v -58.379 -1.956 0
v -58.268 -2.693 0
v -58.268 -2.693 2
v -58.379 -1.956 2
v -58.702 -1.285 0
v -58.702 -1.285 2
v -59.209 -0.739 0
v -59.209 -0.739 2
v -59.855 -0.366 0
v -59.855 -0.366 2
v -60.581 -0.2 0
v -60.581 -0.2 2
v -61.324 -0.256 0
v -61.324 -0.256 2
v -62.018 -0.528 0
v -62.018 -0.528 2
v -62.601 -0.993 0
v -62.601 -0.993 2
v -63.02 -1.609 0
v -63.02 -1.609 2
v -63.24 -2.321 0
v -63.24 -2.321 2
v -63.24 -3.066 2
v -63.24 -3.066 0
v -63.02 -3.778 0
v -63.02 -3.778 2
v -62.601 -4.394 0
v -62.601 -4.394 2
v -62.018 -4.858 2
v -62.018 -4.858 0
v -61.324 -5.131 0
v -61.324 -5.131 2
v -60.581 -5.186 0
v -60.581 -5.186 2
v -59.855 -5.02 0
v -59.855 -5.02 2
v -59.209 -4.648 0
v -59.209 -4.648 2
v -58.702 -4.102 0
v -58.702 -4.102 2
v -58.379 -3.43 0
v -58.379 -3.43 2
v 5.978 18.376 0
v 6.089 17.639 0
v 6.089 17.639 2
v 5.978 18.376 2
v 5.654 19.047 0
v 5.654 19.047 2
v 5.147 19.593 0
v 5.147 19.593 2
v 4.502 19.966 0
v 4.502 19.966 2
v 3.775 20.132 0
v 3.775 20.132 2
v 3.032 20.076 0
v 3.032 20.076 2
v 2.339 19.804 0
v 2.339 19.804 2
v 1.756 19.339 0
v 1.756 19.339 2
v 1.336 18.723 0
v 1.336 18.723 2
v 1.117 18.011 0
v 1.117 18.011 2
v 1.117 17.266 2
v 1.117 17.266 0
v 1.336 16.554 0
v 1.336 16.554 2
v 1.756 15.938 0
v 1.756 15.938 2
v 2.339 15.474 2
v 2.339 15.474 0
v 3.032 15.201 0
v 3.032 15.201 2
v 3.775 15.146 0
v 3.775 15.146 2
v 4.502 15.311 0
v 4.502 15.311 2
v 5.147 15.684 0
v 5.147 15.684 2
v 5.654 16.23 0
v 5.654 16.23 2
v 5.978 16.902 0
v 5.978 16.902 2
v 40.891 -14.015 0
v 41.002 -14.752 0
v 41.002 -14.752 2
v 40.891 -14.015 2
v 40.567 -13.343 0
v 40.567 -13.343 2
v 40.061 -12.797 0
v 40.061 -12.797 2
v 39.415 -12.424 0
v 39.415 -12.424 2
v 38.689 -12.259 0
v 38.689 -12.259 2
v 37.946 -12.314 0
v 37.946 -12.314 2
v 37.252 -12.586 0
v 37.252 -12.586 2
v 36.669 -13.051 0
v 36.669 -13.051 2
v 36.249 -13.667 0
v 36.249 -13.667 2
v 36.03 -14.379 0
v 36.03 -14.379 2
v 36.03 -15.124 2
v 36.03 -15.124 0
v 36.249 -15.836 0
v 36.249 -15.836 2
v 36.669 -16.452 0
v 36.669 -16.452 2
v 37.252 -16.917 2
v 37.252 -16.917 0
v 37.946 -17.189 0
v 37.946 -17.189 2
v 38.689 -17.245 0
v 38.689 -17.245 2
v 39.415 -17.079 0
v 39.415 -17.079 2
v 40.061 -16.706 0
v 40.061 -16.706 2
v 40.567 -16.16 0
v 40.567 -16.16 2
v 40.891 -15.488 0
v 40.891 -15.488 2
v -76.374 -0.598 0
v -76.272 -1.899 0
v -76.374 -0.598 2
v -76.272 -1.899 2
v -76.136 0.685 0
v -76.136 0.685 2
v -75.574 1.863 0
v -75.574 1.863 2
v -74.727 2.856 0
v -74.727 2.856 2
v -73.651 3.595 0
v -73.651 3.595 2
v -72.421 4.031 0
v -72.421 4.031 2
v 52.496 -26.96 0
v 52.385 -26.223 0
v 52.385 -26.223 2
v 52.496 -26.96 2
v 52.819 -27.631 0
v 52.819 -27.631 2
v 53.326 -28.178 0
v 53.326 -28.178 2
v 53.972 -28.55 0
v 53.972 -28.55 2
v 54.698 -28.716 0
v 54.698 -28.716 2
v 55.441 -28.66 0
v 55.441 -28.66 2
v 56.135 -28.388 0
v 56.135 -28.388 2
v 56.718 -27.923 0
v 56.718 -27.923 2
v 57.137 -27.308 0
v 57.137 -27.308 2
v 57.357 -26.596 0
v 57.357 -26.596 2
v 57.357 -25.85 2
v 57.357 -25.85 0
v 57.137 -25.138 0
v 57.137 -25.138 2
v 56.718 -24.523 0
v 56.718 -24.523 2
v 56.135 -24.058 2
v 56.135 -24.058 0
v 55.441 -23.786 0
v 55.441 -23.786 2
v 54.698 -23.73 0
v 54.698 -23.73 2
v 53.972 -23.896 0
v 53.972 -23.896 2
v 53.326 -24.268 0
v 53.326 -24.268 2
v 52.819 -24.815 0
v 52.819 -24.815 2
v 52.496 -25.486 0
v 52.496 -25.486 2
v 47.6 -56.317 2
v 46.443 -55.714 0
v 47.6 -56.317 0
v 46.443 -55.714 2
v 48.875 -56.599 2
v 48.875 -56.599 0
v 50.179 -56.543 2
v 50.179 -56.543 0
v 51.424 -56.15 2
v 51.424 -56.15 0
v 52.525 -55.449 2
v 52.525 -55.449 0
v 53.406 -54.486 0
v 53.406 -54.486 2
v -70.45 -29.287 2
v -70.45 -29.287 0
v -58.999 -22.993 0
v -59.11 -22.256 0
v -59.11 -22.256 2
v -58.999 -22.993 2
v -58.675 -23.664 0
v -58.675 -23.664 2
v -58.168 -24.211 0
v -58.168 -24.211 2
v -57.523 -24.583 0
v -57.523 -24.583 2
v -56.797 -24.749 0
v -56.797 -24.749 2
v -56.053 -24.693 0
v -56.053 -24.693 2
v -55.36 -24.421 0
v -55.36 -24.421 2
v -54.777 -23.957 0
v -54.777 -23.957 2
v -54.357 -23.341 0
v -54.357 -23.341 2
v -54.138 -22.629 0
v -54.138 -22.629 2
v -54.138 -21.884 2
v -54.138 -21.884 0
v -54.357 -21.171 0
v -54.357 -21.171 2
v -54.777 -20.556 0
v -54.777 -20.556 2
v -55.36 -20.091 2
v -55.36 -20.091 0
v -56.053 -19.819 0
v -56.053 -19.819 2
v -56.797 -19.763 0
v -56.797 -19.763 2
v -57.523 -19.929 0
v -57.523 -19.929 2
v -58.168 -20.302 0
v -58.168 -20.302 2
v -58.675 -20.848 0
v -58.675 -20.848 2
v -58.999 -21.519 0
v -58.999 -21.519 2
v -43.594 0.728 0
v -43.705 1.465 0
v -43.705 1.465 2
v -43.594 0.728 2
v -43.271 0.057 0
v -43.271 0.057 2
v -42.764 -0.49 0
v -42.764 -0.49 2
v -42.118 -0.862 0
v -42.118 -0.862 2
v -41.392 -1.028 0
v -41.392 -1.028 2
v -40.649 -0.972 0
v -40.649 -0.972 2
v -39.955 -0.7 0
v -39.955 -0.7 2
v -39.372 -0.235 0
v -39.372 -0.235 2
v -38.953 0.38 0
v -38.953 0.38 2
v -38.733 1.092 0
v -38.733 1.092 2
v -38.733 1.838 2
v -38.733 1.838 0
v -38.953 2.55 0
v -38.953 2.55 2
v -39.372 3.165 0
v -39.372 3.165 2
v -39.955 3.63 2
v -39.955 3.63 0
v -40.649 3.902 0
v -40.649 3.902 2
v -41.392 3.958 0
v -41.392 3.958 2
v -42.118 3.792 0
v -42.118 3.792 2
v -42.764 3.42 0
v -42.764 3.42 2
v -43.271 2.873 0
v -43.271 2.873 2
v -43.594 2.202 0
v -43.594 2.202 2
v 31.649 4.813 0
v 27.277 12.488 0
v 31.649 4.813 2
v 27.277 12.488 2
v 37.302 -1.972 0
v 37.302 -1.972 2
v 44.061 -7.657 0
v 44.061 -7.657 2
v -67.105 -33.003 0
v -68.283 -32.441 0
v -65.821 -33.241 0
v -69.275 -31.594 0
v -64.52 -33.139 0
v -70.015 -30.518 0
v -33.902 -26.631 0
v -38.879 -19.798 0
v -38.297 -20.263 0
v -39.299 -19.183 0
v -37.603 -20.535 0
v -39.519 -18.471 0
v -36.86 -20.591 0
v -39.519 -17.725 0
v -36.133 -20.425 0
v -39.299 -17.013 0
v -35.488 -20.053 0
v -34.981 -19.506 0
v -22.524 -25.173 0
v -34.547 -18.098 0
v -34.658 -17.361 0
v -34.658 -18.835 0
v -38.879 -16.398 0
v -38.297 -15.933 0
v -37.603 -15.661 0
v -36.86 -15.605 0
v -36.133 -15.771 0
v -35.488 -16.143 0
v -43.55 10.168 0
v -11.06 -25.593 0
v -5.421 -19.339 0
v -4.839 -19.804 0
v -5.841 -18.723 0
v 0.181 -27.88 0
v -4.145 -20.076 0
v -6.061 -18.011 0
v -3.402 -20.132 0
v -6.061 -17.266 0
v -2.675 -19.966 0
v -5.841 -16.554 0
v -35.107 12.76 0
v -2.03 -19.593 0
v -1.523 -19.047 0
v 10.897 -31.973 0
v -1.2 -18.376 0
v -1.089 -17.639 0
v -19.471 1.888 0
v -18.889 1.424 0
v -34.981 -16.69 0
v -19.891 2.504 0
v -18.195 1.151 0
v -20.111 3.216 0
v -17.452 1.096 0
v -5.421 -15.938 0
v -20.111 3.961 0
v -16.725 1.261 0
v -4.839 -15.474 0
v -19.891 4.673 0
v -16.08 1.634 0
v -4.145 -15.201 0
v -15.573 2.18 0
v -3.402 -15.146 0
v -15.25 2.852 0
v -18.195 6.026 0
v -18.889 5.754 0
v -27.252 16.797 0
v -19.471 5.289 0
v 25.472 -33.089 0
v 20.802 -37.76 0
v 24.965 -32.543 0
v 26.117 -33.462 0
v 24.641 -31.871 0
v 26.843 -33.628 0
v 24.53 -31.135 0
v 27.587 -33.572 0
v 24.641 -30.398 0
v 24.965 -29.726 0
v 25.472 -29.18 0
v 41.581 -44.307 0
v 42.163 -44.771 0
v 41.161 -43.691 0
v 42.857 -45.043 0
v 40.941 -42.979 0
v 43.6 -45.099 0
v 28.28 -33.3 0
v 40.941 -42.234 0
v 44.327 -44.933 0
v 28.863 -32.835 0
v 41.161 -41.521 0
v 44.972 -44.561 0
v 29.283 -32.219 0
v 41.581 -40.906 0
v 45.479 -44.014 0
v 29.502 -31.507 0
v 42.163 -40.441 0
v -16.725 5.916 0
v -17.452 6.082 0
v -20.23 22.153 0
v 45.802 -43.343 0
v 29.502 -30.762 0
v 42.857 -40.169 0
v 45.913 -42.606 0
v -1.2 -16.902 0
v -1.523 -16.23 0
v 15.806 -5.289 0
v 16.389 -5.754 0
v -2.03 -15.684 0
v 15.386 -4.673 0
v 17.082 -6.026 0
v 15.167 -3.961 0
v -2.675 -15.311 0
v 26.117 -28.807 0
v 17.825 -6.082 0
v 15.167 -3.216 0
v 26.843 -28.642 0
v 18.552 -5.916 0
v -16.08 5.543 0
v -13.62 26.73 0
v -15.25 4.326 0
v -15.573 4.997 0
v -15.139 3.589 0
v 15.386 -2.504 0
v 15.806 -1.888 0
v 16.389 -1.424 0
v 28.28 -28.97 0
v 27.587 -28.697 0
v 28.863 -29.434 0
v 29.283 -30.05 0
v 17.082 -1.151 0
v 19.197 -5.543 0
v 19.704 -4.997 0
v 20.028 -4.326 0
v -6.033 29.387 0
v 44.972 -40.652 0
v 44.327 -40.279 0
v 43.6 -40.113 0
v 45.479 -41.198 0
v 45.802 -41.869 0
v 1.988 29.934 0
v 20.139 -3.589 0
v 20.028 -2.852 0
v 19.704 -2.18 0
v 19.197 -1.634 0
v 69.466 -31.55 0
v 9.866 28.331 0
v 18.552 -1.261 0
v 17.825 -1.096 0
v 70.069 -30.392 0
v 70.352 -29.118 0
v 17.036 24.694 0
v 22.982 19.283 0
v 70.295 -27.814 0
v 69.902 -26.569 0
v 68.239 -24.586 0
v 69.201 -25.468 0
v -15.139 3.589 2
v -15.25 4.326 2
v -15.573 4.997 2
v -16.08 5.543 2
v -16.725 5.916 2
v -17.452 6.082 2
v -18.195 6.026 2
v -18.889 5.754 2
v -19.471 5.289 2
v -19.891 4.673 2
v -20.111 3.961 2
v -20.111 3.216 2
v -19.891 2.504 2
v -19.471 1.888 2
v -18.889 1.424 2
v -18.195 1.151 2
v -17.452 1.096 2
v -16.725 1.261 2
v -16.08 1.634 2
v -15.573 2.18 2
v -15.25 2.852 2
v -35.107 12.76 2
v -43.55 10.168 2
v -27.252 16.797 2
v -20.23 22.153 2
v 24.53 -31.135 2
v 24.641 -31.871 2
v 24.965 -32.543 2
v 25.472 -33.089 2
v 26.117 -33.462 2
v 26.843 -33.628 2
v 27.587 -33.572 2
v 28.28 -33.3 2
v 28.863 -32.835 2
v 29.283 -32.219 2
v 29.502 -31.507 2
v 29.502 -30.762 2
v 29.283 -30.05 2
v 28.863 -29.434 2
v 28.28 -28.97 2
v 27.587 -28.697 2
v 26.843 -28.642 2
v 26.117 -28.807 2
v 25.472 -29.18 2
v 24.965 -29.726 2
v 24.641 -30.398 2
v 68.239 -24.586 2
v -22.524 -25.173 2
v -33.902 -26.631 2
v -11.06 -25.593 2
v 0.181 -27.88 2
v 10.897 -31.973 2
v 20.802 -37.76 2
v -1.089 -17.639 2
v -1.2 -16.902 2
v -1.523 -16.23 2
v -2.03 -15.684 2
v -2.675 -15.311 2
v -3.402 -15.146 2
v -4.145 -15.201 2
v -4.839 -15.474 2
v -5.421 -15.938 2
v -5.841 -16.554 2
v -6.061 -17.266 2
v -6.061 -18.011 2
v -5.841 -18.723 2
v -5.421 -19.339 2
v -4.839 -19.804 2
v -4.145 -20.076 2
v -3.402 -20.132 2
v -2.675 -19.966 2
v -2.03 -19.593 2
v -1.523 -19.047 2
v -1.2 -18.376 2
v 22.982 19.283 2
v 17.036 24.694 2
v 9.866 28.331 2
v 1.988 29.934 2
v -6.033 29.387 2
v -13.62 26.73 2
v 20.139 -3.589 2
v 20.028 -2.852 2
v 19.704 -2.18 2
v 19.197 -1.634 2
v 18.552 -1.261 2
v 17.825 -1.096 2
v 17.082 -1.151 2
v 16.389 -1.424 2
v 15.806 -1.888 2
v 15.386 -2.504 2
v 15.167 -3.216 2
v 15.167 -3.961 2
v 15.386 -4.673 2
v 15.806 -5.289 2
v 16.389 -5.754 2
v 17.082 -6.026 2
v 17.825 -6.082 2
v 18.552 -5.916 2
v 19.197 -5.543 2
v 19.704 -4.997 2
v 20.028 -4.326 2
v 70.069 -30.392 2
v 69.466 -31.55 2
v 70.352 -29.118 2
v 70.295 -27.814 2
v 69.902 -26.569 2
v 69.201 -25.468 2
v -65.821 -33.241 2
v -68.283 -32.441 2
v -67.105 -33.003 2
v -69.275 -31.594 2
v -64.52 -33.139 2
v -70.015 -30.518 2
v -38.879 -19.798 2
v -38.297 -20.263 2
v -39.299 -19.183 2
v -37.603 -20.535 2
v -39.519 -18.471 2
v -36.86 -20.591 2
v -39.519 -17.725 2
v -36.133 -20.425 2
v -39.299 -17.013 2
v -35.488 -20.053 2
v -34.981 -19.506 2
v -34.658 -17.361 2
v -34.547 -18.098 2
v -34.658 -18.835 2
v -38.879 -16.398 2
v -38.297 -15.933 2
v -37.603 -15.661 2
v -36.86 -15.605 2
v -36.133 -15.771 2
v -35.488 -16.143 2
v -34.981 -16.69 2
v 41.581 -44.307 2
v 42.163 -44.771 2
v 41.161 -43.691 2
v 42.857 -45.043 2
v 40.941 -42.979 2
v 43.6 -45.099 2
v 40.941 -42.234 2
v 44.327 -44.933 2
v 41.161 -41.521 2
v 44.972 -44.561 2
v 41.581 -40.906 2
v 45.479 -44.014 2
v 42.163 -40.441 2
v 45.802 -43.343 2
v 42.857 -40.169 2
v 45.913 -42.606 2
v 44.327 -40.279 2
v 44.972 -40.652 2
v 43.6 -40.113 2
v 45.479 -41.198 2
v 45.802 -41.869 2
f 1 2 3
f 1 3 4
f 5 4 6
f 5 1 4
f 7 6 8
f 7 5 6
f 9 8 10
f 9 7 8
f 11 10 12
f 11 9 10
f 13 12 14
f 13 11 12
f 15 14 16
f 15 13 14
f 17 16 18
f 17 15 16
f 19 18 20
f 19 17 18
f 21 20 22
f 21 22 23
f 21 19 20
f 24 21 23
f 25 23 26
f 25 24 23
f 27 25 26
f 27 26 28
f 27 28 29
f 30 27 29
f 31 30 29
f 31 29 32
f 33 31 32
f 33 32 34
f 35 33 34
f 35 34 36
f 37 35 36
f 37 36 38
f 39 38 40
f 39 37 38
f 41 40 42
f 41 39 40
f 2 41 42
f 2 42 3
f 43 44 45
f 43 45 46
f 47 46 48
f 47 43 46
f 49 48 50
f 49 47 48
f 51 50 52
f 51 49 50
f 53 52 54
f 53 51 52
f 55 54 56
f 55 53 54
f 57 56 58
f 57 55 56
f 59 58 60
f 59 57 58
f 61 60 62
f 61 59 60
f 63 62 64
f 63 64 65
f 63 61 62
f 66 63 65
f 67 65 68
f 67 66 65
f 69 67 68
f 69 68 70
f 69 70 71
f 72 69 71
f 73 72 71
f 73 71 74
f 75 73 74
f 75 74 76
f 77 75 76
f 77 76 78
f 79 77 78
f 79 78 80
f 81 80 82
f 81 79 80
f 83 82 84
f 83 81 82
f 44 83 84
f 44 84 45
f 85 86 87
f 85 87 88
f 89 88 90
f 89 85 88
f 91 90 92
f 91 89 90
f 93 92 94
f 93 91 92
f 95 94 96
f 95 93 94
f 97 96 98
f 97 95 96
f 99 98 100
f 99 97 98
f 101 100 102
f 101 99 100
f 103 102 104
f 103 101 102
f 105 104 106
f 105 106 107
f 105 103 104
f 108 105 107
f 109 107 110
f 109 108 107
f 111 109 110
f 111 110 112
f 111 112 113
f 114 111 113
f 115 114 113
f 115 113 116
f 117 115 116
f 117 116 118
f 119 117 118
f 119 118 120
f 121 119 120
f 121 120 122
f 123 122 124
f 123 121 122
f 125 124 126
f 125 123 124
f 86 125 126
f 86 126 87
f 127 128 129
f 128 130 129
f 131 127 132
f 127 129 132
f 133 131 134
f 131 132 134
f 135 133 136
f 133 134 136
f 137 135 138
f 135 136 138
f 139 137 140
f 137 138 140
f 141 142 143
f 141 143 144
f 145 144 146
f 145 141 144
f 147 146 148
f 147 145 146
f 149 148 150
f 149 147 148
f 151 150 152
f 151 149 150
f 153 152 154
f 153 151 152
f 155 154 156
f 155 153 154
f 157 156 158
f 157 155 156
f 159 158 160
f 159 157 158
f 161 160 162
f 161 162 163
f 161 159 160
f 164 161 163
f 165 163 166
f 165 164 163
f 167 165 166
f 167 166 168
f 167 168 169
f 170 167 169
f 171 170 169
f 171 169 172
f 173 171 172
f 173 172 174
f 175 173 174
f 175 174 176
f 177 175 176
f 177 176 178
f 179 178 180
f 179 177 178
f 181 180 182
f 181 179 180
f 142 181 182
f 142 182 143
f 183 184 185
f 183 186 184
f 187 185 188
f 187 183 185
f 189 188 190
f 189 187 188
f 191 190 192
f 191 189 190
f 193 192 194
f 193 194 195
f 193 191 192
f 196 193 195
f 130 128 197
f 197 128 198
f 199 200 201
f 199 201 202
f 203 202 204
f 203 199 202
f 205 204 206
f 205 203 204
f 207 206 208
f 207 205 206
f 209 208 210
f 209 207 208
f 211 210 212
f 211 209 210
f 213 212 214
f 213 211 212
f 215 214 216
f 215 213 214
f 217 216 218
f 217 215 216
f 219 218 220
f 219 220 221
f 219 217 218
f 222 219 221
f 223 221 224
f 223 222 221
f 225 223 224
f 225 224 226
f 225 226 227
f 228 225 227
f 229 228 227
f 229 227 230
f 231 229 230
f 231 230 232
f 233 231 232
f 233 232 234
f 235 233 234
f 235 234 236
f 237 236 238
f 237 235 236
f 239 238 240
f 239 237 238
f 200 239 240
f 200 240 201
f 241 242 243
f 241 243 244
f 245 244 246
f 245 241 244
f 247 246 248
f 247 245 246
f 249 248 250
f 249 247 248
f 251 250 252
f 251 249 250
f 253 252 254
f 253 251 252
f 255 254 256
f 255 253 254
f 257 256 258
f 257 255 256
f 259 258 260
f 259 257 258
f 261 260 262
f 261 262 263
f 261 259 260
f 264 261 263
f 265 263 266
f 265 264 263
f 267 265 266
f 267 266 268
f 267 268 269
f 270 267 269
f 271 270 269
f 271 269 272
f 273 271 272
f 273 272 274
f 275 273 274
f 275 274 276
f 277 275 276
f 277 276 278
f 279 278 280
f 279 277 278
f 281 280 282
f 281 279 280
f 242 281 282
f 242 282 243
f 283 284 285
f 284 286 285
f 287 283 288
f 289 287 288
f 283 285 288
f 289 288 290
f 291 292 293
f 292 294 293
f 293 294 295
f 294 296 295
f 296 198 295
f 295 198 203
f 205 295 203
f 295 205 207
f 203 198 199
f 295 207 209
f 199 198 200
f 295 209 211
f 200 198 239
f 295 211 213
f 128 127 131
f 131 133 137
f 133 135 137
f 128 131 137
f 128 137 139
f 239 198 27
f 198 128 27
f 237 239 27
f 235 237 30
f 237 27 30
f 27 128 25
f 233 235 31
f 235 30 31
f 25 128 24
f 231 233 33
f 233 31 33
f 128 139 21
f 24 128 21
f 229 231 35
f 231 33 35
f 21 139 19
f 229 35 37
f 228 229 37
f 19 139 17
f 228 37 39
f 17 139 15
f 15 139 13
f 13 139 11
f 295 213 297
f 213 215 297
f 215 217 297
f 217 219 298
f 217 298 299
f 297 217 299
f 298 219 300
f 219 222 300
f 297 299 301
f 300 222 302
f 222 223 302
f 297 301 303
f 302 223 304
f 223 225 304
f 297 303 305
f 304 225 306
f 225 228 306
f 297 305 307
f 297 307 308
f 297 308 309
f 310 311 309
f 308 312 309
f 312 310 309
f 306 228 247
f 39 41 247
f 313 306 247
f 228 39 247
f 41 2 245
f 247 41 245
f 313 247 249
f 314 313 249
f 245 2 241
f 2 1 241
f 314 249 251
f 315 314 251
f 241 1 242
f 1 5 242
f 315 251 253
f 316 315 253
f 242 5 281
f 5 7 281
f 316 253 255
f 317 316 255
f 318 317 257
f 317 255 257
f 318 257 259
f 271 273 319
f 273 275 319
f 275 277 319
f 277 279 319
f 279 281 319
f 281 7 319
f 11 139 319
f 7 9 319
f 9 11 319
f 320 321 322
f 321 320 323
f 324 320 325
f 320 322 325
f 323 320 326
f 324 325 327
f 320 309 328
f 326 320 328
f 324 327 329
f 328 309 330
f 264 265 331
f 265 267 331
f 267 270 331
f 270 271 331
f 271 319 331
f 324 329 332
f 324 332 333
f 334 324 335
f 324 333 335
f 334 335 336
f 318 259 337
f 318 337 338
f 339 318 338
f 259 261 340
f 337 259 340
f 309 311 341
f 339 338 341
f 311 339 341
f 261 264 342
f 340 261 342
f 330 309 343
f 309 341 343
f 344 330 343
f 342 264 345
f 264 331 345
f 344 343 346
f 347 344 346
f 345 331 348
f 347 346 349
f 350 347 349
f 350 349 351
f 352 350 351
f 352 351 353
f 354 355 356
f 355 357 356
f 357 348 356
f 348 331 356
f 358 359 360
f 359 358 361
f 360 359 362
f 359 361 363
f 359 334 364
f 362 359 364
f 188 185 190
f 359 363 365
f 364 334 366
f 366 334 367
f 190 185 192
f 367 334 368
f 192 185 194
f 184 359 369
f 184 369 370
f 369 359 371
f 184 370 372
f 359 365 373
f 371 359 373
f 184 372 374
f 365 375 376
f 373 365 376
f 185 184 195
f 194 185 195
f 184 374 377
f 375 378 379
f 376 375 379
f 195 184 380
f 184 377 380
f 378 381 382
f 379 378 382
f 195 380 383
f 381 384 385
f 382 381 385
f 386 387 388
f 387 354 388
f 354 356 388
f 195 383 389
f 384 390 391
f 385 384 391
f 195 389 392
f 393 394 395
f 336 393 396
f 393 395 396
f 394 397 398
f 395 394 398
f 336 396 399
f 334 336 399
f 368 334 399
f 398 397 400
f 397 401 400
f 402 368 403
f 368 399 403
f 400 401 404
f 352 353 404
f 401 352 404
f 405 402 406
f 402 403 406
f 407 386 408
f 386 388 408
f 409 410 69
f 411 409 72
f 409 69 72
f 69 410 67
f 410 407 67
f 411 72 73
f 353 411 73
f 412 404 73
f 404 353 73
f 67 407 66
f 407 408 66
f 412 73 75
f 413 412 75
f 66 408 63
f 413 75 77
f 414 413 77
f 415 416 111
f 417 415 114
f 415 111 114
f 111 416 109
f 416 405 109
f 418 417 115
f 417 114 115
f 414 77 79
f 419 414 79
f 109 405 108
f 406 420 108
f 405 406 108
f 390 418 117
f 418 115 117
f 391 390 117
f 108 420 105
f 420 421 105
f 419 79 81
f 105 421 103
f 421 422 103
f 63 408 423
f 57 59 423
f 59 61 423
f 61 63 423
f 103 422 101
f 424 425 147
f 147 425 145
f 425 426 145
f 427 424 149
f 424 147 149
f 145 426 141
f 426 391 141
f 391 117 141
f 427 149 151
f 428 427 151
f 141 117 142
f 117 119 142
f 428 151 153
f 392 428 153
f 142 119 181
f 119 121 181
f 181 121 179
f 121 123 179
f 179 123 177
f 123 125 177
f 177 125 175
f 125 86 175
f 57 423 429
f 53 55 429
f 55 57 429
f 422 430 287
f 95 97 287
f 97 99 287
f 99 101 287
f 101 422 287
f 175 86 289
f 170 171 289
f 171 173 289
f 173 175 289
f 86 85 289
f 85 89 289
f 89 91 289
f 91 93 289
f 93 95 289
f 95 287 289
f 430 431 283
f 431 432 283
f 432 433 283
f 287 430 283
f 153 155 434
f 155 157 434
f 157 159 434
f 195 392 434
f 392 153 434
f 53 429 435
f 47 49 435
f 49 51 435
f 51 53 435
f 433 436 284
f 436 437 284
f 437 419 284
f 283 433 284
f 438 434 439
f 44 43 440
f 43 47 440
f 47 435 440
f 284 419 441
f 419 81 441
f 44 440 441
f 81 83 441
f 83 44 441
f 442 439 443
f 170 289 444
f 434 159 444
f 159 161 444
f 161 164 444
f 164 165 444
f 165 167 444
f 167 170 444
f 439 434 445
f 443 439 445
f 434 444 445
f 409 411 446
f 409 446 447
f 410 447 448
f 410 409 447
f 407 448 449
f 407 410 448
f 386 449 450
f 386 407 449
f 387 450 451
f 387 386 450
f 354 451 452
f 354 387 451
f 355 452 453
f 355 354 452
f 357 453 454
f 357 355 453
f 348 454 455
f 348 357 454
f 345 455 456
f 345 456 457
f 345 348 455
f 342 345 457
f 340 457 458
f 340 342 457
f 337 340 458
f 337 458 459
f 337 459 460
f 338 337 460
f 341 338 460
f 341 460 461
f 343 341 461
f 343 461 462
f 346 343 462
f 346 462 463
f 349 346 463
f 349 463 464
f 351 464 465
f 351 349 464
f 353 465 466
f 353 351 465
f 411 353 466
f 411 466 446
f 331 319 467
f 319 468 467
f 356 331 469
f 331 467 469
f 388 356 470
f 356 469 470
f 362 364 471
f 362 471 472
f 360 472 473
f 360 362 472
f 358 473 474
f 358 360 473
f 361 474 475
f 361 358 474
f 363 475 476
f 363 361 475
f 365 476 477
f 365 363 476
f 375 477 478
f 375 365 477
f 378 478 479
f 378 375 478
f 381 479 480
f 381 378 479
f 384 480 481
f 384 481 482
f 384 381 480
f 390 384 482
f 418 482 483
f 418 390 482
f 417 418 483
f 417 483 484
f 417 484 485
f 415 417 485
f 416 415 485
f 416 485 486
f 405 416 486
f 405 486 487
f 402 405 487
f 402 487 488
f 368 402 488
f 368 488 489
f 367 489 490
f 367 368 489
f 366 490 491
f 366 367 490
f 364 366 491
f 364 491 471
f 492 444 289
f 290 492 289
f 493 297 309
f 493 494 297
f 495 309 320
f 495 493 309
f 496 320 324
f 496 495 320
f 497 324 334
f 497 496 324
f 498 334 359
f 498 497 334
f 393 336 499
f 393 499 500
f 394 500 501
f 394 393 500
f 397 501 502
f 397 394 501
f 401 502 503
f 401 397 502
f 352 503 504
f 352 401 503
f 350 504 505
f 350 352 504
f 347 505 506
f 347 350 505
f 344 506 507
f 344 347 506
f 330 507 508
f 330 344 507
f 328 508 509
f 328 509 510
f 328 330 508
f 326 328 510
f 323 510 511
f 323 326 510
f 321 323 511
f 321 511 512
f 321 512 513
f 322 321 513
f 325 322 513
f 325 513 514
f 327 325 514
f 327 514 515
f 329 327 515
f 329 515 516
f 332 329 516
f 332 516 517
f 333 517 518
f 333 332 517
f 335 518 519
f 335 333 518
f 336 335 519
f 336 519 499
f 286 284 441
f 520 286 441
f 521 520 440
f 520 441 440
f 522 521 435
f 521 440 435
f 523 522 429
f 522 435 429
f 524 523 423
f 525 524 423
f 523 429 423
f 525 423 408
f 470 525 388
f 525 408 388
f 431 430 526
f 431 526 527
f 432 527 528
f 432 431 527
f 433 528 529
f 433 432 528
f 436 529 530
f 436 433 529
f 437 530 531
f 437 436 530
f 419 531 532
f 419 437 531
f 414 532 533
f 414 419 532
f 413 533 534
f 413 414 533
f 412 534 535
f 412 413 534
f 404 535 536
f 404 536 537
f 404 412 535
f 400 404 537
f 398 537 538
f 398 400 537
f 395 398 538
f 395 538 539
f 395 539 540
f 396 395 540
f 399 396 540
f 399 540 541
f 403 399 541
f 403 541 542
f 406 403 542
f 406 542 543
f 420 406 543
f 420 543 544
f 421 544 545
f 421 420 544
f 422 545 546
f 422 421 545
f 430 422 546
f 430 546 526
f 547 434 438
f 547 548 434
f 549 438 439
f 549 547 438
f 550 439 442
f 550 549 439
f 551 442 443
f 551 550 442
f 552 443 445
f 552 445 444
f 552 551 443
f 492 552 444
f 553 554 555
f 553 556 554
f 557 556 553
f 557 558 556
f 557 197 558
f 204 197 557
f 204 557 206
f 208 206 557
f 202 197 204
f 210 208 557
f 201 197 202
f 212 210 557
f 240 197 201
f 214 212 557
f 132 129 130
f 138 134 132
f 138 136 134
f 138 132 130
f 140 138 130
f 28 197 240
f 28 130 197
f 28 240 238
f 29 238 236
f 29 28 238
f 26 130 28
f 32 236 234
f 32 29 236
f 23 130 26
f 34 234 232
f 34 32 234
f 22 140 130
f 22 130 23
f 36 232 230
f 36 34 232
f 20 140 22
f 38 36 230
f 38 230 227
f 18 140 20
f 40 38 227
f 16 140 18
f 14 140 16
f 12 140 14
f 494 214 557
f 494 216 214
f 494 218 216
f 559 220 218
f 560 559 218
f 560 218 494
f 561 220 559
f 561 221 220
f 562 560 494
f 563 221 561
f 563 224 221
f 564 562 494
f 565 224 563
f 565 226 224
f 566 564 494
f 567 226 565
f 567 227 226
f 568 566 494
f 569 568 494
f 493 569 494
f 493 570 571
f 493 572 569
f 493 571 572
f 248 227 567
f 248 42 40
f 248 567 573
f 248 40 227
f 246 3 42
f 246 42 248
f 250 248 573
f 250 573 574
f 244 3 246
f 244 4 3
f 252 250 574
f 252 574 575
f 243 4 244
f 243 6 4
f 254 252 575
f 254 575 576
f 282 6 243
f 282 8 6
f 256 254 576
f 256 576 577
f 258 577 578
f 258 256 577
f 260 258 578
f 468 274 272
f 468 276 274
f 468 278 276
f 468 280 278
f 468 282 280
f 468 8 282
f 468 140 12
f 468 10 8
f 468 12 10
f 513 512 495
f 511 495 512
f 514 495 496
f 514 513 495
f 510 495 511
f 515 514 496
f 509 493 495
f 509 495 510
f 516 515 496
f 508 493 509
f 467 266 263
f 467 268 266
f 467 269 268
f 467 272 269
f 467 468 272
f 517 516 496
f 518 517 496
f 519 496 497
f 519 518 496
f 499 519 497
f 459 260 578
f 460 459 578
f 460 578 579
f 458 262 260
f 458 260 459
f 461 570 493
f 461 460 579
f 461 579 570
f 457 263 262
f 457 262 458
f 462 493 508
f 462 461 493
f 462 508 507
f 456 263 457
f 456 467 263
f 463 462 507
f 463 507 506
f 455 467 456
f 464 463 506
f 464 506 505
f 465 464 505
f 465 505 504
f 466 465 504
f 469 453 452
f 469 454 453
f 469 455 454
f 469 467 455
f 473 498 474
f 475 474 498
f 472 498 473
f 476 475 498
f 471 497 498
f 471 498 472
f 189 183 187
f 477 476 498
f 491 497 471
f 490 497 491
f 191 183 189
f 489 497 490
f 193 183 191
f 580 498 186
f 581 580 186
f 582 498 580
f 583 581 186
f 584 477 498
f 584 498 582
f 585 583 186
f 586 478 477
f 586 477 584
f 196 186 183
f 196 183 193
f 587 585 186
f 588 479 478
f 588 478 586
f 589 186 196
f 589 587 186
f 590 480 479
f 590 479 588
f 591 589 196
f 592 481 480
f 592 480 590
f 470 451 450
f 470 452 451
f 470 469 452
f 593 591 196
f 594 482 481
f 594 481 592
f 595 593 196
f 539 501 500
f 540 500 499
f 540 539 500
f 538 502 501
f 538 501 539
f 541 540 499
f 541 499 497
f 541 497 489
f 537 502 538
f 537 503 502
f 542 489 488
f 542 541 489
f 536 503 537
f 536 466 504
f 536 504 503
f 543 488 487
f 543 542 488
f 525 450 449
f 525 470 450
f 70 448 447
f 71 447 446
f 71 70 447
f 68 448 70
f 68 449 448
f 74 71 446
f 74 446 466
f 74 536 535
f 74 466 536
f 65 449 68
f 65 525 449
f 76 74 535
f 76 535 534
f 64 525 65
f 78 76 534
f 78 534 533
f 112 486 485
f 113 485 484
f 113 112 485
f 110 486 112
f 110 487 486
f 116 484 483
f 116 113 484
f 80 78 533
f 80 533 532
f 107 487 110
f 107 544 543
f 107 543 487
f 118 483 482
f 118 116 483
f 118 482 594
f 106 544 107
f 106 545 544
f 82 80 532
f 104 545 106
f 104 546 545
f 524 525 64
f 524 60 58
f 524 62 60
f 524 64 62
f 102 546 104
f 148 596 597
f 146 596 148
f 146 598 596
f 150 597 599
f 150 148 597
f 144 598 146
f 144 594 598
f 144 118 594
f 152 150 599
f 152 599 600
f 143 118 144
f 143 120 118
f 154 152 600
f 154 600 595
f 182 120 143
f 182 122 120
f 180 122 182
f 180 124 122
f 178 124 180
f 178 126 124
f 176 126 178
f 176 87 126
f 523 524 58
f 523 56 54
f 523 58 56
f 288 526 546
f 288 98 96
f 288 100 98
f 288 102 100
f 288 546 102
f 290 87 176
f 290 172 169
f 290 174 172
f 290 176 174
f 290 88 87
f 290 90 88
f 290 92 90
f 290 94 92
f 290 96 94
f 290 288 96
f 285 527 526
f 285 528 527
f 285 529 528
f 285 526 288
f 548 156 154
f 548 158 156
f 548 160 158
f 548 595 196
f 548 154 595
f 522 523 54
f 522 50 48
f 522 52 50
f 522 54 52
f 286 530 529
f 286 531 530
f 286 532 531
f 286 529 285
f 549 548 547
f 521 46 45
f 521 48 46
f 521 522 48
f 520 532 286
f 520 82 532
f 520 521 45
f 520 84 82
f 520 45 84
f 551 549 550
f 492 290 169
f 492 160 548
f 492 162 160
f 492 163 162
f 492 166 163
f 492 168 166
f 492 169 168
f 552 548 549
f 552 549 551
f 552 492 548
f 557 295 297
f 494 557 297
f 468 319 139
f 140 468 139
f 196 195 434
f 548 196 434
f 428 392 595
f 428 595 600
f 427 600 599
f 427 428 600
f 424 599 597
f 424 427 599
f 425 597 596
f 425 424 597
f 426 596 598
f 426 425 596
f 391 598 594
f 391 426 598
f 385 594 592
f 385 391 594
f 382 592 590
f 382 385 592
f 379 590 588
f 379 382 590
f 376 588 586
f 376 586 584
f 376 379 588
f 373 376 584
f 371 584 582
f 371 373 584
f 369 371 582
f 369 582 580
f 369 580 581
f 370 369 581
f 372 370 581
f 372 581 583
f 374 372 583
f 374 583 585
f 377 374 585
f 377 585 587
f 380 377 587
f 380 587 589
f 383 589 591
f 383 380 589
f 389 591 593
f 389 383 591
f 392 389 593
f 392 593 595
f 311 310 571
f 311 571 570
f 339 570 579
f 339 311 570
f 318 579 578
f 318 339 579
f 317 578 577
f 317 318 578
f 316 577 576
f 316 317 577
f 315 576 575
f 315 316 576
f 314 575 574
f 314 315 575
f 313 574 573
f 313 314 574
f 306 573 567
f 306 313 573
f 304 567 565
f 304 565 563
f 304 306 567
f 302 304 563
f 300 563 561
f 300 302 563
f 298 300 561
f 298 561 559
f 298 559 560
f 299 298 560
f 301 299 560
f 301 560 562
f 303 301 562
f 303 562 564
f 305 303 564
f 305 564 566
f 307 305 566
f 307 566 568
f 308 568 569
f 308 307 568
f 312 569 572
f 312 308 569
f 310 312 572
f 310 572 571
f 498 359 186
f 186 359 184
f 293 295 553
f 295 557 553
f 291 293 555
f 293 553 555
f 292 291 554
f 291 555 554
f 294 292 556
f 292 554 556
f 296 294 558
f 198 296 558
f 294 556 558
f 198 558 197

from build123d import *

# Parameters (mm, degrees)
SKETCH1_R           = 2.5
BOSS_EXTRUDE1_DEPTH = 2
FILLET1_R           = 50
FILLET2_R           = 70
FILLET3_R           = 5


with BuildPart() as part:
    # Sketch1 → Boss-Extrude1 (new body)
    with BuildSketch(Plane.XY):
        with BuildLine():
            Line((-77.311392181, 2.991427603), (-69.410747929, -34.178181225))
            Line((-69.410747929, -34.178181225), (-4.13058082, -20.302453359))
            Line((-4.13058082, -20.302453359), (50.538451031, -58.582121568))
            Line((50.538451031, -58.582121568), (72.334355612, -27.454343885))
            Line((72.334355612, -27.454343885), (29.915692131, 2.247524046))
            ThreePointArc((29.915692131, 2.247524046), (5.981038033, 29.397741139), (-26.659362194, 13.757848938))
            Line((-26.659362194, 13.757848938), (-77.311392181, 2.991427603))
        make_face()
        with Locations((-60.767972952, -2.693225442)):
            Circle(SKETCH1_R, mode=Mode.SUBTRACT)
        with Locations(Location((-56.609739136, -22.256177456, 0), (0, 0, 180))):
            Circle(SKETCH1_R, mode=Mode.SUBTRACT)
        with Locations((-37.046787121, -18.09794364)):
            Circle(SKETCH1_R, mode=Mode.SUBTRACT)
        with Locations(Location((-41.205020938, 1.465008375, 0), (0, 0, 180))):
            Circle(SKETCH1_R, mode=Mode.SUBTRACT)
        with Locations((38.501846135, -14.751537011)):
            Circle(SKETCH1_R, mode=Mode.SUBTRACT)
        with Locations(Location((27.030317408, -31.134577897, 0), (0, 0, 180))):
            Circle(SKETCH1_R, mode=Mode.SUBTRACT)
        with Locations((43.413358294, -42.606106624)):
            Circle(SKETCH1_R, mode=Mode.SUBTRACT)
        with Locations(Location((54.884887021, -26.223065738, 0), (0, 0, 180))):
            Circle(SKETCH1_R, mode=Mode.SUBTRACT)
        with Locations((3.58862282, 17.638644683)):
            Circle(SKETCH1_R, mode=Mode.SUBTRACT)
        with Locations((17.638644683, -3.58862282)):
            Circle(SKETCH1_R, mode=Mode.SUBTRACT)
        with Locations((-3.58862282, -17.638644683)):
            Circle(SKETCH1_R, mode=Mode.SUBTRACT)
        with Locations((-17.638644683, 3.58862282)):
            Circle(SKETCH1_R, mode=Mode.SUBTRACT)
    extrude(amount=BOSS_EXTRUDE1_DEPTH)

    # Fillet1
    fillet1_edges = [part.edges().sort_by_distance(p)[0] for p in [
        (-26.659362194, 13.757848938, 1),
        (29.915692131, 2.247524046, 1),
    ]]
    fillet(fillet1_edges, radius=FILLET1_R)

    # Fillet2
    fillet2_edges = [part.edges().sort_by_distance(p)[0] for p in [
        (-4.13058082, -20.302453359, 1),
    ]]
    fillet(fillet2_edges, radius=FILLET2_R)

    # Fillet3
    fillet3_edges = [part.edges().sort_by_distance(p)[0] for p in [
        (72.334355612, -27.454343885, 1),
        (50.538451031, -58.582121568, 1),
        (-69.410747929, -34.178181225, 1),
        (-77.311392181, 2.991427603, 1),
    ]]
    fillet(fillet3_edges, radius=FILLET3_R)


solid = part.part
